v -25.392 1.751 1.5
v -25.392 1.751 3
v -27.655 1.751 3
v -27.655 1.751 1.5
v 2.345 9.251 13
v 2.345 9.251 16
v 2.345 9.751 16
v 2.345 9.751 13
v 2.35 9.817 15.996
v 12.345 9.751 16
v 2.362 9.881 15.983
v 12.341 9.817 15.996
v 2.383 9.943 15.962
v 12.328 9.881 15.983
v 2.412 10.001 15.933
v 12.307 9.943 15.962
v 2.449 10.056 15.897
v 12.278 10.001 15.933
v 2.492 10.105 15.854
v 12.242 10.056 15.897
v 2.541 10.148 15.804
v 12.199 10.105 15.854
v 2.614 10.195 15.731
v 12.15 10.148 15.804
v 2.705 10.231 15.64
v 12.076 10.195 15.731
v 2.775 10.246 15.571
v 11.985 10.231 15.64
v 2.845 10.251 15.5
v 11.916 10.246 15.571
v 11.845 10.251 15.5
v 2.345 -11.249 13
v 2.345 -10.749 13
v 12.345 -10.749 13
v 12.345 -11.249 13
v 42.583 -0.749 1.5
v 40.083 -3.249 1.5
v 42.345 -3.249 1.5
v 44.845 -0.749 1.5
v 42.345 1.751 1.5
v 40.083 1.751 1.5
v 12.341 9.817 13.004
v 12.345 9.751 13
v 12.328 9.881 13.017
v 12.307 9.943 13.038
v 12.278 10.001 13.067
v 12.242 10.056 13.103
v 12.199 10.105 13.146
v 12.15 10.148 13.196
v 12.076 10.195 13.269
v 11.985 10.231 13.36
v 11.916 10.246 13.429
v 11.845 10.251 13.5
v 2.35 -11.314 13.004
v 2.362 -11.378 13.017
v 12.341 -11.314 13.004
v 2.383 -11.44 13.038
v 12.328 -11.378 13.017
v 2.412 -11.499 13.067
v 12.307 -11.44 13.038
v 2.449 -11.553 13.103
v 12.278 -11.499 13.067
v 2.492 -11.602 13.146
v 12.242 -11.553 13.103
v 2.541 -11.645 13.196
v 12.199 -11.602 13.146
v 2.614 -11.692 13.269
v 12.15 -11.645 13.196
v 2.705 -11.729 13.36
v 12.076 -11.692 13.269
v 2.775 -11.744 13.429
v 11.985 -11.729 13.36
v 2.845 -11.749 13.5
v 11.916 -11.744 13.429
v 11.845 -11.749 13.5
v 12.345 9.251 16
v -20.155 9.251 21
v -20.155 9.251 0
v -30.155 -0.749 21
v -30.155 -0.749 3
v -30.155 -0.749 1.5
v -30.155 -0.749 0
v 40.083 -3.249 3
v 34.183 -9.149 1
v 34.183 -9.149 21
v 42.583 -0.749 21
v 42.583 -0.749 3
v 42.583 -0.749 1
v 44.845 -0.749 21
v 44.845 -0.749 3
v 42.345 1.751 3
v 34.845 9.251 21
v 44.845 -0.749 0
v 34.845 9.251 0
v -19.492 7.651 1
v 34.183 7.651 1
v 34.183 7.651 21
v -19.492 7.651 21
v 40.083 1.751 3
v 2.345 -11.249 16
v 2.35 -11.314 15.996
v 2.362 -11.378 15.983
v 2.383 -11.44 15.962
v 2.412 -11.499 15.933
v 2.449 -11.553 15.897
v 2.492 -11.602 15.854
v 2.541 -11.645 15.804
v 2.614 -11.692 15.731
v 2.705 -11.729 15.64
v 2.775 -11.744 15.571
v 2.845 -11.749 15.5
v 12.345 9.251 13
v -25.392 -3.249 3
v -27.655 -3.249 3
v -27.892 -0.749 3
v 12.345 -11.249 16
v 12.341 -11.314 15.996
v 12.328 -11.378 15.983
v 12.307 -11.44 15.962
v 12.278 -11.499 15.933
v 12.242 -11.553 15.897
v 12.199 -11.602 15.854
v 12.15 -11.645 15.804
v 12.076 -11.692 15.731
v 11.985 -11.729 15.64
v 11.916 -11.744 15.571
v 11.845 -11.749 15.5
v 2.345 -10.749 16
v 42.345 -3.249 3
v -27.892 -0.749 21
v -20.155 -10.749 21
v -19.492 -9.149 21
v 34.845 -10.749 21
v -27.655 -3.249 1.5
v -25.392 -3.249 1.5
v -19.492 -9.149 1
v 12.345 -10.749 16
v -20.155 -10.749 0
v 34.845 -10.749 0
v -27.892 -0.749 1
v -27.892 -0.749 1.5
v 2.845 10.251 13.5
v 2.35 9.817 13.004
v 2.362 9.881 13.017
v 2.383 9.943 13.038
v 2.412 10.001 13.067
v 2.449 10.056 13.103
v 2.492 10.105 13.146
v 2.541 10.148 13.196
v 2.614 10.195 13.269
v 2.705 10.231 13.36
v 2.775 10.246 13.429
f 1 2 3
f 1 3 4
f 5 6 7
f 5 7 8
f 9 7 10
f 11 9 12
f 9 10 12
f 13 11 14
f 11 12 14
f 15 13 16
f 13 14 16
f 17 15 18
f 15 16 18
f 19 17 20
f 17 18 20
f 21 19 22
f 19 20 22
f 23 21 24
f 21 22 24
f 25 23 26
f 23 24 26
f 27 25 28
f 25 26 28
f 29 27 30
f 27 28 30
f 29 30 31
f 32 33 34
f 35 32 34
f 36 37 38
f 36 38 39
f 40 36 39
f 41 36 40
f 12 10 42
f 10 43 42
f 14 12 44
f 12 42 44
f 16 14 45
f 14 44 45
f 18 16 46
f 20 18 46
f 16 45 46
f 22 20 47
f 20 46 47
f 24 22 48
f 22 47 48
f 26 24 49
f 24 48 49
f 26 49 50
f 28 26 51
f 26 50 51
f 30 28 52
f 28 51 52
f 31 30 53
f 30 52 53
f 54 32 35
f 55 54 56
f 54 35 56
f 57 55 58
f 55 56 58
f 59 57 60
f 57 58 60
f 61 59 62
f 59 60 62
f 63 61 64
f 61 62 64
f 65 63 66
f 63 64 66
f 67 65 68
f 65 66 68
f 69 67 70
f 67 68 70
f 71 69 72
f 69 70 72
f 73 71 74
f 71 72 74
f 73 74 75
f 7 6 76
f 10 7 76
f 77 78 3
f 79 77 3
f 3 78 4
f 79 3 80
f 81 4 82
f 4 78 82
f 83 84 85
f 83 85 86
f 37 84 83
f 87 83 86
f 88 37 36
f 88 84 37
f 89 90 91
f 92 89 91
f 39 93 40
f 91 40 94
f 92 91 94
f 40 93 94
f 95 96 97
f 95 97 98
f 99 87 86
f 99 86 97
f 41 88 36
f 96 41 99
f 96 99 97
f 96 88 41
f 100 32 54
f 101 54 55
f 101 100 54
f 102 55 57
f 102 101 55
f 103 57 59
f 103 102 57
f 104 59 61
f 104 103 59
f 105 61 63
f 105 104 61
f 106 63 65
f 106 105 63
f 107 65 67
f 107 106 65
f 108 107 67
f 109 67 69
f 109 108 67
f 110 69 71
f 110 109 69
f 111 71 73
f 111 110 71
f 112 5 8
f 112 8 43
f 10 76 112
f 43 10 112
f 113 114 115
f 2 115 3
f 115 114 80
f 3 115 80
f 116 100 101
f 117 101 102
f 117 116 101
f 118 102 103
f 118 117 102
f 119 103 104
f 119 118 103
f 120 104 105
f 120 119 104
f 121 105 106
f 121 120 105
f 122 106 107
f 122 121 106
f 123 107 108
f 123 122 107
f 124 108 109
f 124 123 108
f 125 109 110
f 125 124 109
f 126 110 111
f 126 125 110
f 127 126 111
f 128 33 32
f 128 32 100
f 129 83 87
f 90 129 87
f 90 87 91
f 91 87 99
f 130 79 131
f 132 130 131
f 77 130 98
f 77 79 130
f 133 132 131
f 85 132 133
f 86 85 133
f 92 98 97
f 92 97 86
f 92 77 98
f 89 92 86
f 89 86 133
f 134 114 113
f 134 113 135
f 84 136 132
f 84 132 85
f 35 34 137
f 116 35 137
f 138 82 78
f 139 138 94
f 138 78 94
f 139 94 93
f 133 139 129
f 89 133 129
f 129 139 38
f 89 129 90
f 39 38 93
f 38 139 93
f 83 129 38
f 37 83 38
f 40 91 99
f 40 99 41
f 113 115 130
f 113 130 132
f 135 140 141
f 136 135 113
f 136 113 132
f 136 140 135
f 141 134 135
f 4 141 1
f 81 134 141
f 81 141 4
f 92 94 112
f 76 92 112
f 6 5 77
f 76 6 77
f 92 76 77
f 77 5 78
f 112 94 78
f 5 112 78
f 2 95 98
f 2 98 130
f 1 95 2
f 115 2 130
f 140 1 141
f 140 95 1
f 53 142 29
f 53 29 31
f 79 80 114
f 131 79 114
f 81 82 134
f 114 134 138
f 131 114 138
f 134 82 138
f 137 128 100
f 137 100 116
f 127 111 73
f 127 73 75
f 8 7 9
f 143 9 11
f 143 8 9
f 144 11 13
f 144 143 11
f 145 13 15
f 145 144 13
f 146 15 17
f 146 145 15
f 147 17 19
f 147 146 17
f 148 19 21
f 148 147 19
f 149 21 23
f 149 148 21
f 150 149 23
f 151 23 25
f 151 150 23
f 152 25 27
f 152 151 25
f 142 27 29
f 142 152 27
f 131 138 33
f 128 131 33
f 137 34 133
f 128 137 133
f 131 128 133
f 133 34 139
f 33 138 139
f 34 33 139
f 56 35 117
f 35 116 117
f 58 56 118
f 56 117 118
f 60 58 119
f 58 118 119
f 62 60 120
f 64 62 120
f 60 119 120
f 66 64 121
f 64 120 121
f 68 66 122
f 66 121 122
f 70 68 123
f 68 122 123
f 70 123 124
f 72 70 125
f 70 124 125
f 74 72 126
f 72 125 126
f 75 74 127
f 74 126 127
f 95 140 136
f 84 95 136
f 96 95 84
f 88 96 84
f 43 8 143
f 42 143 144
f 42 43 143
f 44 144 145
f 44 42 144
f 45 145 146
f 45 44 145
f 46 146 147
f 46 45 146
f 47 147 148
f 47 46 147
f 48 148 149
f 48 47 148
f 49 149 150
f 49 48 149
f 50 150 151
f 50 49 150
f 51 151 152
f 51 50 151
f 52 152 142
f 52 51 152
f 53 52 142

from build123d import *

# Parameters (mm, degrees)
BOSS_EXTRU_1_DEPTH           = 1
BOSS_EXTRU_2_DEPTH           = 20
ENL_V_MAT_EXTRU_1_DEPTH      = 51.671873049
ENL_V_MAT_EXTRU_1_DEPTH_BACK = 51.671873049
ESQUISSE5_W                  = 1.5
ESQUISSE5_H                  = 5
ESQUISSE9_W                  = 10
ESQUISSE9_H                  = 3
BOSS_EXTRU_5_DEPTH           = 1
CONG_1_R                     = 0.5
ESQUISSE10_W                 = 10
ESQUISSE10_H                 = 3
BOSS_EXTRU_6_DEPTH           = 1
CONG_2_R                     = 0.5


with BuildPart() as part:
    # Esquisse1 → Boss.-Extru.1 (new body)
    with BuildSketch(Plane.XY):
        Polygon((34.845351237, 9.251363312), (-20.154648763, 9.251363312), (-30.154648763, -0.748636688), (-20.154648763, -10.748636688), (34.845351237, -10.748636688), (44.845351237, -0.748636688), align=None)
    extrude(amount=BOSS_EXTRU_1_DEPTH)

    # Esquisse2 → Boss.-Extru.2 (add)
    with BuildSketch(Plane.XY.offset(1)):
        Polygon((-20.154648763, -10.748636688), (34.845351237, -10.748636688), (44.845351237, -0.748636688), (34.845351237, 9.251363312), (-20.154648763, 9.251363312), (-30.154648763, -0.748636688), align=None)
        Polygon((-19.491907063, 7.651363312), (-27.891907063, -0.748636688), (-19.491907063, -9.148636688), (34.182609538, -9.148636688), (42.582609538, -0.748636688), (34.182609538, 7.651363312), align=None, mode=Mode.SUBTRACT)
    extrude(amount=BOSS_EXTRU_2_DEPTH)

    # Esquisse5 → Enlèv. mat.-Extru.1 (cut, two sides: drawn at the far end of the back side and taken through both)
    with BuildSketch(Plane(origin=(0, 0, 0), x_dir=(0, 0, -1), z_dir=(1, 0, 0)).offset(-ENL_V_MAT_EXTRU_1_DEPTH_BACK)):
        with Locations((-2.25, -0.748636688)):
            Rectangle(ESQUISSE5_W, ESQUISSE5_H)
    extrude(amount=ENL_V_MAT_EXTRU_1_DEPTH + ENL_V_MAT_EXTRU_1_DEPTH_BACK, mode=Mode.SUBTRACT)

    # Esquisse9 → Boss.-Extru.5 (add)
    with BuildSketch(Plane(origin=(0, 9.251363312, 0), x_dir=(1, 0, 0), z_dir=(0, 1, 0))):
        with Locations((7.345351237, -14.5)):
            Rectangle(ESQUISSE9_W, ESQUISSE9_H)
    extrude(amount=BOSS_EXTRU_5_DEPTH)

    # Congé1
    cong_1_edges = [part.edges().sort_by_distance(p)[0] for p in [
        (2.345351237, 10.251363312, 14.5),
        (7.345351237, 10.251363312, 16),
        (12.345351237, 10.251363312, 14.5),
        (7.345351237, 10.251363312, 13),
    ]]
    fillet(cong_1_edges, radius=CONG_1_R)

    # Esquisse10 → Boss.-Extru.6 (add)
    with BuildSketch(Plane.XZ.offset(10.748636688)):
        with Locations((7.345351237, 14.5)):
            Rectangle(ESQUISSE10_W, ESQUISSE10_H)
    extrude(amount=BOSS_EXTRU_6_DEPTH)

    # Congé2
    cong_2_edges = [part.edges().sort_by_distance(p)[0] for p in [
        (2.345351237, -11.748636688, 14.5),
        (7.345351237, -11.748636688, 13),
        (12.345351237, -11.748636688, 14.5),
        (7.345351237, -11.748636688, 16),
    ]]
    fillet(cong_2_edges, radius=CONG_2_R)


solid = part.part
